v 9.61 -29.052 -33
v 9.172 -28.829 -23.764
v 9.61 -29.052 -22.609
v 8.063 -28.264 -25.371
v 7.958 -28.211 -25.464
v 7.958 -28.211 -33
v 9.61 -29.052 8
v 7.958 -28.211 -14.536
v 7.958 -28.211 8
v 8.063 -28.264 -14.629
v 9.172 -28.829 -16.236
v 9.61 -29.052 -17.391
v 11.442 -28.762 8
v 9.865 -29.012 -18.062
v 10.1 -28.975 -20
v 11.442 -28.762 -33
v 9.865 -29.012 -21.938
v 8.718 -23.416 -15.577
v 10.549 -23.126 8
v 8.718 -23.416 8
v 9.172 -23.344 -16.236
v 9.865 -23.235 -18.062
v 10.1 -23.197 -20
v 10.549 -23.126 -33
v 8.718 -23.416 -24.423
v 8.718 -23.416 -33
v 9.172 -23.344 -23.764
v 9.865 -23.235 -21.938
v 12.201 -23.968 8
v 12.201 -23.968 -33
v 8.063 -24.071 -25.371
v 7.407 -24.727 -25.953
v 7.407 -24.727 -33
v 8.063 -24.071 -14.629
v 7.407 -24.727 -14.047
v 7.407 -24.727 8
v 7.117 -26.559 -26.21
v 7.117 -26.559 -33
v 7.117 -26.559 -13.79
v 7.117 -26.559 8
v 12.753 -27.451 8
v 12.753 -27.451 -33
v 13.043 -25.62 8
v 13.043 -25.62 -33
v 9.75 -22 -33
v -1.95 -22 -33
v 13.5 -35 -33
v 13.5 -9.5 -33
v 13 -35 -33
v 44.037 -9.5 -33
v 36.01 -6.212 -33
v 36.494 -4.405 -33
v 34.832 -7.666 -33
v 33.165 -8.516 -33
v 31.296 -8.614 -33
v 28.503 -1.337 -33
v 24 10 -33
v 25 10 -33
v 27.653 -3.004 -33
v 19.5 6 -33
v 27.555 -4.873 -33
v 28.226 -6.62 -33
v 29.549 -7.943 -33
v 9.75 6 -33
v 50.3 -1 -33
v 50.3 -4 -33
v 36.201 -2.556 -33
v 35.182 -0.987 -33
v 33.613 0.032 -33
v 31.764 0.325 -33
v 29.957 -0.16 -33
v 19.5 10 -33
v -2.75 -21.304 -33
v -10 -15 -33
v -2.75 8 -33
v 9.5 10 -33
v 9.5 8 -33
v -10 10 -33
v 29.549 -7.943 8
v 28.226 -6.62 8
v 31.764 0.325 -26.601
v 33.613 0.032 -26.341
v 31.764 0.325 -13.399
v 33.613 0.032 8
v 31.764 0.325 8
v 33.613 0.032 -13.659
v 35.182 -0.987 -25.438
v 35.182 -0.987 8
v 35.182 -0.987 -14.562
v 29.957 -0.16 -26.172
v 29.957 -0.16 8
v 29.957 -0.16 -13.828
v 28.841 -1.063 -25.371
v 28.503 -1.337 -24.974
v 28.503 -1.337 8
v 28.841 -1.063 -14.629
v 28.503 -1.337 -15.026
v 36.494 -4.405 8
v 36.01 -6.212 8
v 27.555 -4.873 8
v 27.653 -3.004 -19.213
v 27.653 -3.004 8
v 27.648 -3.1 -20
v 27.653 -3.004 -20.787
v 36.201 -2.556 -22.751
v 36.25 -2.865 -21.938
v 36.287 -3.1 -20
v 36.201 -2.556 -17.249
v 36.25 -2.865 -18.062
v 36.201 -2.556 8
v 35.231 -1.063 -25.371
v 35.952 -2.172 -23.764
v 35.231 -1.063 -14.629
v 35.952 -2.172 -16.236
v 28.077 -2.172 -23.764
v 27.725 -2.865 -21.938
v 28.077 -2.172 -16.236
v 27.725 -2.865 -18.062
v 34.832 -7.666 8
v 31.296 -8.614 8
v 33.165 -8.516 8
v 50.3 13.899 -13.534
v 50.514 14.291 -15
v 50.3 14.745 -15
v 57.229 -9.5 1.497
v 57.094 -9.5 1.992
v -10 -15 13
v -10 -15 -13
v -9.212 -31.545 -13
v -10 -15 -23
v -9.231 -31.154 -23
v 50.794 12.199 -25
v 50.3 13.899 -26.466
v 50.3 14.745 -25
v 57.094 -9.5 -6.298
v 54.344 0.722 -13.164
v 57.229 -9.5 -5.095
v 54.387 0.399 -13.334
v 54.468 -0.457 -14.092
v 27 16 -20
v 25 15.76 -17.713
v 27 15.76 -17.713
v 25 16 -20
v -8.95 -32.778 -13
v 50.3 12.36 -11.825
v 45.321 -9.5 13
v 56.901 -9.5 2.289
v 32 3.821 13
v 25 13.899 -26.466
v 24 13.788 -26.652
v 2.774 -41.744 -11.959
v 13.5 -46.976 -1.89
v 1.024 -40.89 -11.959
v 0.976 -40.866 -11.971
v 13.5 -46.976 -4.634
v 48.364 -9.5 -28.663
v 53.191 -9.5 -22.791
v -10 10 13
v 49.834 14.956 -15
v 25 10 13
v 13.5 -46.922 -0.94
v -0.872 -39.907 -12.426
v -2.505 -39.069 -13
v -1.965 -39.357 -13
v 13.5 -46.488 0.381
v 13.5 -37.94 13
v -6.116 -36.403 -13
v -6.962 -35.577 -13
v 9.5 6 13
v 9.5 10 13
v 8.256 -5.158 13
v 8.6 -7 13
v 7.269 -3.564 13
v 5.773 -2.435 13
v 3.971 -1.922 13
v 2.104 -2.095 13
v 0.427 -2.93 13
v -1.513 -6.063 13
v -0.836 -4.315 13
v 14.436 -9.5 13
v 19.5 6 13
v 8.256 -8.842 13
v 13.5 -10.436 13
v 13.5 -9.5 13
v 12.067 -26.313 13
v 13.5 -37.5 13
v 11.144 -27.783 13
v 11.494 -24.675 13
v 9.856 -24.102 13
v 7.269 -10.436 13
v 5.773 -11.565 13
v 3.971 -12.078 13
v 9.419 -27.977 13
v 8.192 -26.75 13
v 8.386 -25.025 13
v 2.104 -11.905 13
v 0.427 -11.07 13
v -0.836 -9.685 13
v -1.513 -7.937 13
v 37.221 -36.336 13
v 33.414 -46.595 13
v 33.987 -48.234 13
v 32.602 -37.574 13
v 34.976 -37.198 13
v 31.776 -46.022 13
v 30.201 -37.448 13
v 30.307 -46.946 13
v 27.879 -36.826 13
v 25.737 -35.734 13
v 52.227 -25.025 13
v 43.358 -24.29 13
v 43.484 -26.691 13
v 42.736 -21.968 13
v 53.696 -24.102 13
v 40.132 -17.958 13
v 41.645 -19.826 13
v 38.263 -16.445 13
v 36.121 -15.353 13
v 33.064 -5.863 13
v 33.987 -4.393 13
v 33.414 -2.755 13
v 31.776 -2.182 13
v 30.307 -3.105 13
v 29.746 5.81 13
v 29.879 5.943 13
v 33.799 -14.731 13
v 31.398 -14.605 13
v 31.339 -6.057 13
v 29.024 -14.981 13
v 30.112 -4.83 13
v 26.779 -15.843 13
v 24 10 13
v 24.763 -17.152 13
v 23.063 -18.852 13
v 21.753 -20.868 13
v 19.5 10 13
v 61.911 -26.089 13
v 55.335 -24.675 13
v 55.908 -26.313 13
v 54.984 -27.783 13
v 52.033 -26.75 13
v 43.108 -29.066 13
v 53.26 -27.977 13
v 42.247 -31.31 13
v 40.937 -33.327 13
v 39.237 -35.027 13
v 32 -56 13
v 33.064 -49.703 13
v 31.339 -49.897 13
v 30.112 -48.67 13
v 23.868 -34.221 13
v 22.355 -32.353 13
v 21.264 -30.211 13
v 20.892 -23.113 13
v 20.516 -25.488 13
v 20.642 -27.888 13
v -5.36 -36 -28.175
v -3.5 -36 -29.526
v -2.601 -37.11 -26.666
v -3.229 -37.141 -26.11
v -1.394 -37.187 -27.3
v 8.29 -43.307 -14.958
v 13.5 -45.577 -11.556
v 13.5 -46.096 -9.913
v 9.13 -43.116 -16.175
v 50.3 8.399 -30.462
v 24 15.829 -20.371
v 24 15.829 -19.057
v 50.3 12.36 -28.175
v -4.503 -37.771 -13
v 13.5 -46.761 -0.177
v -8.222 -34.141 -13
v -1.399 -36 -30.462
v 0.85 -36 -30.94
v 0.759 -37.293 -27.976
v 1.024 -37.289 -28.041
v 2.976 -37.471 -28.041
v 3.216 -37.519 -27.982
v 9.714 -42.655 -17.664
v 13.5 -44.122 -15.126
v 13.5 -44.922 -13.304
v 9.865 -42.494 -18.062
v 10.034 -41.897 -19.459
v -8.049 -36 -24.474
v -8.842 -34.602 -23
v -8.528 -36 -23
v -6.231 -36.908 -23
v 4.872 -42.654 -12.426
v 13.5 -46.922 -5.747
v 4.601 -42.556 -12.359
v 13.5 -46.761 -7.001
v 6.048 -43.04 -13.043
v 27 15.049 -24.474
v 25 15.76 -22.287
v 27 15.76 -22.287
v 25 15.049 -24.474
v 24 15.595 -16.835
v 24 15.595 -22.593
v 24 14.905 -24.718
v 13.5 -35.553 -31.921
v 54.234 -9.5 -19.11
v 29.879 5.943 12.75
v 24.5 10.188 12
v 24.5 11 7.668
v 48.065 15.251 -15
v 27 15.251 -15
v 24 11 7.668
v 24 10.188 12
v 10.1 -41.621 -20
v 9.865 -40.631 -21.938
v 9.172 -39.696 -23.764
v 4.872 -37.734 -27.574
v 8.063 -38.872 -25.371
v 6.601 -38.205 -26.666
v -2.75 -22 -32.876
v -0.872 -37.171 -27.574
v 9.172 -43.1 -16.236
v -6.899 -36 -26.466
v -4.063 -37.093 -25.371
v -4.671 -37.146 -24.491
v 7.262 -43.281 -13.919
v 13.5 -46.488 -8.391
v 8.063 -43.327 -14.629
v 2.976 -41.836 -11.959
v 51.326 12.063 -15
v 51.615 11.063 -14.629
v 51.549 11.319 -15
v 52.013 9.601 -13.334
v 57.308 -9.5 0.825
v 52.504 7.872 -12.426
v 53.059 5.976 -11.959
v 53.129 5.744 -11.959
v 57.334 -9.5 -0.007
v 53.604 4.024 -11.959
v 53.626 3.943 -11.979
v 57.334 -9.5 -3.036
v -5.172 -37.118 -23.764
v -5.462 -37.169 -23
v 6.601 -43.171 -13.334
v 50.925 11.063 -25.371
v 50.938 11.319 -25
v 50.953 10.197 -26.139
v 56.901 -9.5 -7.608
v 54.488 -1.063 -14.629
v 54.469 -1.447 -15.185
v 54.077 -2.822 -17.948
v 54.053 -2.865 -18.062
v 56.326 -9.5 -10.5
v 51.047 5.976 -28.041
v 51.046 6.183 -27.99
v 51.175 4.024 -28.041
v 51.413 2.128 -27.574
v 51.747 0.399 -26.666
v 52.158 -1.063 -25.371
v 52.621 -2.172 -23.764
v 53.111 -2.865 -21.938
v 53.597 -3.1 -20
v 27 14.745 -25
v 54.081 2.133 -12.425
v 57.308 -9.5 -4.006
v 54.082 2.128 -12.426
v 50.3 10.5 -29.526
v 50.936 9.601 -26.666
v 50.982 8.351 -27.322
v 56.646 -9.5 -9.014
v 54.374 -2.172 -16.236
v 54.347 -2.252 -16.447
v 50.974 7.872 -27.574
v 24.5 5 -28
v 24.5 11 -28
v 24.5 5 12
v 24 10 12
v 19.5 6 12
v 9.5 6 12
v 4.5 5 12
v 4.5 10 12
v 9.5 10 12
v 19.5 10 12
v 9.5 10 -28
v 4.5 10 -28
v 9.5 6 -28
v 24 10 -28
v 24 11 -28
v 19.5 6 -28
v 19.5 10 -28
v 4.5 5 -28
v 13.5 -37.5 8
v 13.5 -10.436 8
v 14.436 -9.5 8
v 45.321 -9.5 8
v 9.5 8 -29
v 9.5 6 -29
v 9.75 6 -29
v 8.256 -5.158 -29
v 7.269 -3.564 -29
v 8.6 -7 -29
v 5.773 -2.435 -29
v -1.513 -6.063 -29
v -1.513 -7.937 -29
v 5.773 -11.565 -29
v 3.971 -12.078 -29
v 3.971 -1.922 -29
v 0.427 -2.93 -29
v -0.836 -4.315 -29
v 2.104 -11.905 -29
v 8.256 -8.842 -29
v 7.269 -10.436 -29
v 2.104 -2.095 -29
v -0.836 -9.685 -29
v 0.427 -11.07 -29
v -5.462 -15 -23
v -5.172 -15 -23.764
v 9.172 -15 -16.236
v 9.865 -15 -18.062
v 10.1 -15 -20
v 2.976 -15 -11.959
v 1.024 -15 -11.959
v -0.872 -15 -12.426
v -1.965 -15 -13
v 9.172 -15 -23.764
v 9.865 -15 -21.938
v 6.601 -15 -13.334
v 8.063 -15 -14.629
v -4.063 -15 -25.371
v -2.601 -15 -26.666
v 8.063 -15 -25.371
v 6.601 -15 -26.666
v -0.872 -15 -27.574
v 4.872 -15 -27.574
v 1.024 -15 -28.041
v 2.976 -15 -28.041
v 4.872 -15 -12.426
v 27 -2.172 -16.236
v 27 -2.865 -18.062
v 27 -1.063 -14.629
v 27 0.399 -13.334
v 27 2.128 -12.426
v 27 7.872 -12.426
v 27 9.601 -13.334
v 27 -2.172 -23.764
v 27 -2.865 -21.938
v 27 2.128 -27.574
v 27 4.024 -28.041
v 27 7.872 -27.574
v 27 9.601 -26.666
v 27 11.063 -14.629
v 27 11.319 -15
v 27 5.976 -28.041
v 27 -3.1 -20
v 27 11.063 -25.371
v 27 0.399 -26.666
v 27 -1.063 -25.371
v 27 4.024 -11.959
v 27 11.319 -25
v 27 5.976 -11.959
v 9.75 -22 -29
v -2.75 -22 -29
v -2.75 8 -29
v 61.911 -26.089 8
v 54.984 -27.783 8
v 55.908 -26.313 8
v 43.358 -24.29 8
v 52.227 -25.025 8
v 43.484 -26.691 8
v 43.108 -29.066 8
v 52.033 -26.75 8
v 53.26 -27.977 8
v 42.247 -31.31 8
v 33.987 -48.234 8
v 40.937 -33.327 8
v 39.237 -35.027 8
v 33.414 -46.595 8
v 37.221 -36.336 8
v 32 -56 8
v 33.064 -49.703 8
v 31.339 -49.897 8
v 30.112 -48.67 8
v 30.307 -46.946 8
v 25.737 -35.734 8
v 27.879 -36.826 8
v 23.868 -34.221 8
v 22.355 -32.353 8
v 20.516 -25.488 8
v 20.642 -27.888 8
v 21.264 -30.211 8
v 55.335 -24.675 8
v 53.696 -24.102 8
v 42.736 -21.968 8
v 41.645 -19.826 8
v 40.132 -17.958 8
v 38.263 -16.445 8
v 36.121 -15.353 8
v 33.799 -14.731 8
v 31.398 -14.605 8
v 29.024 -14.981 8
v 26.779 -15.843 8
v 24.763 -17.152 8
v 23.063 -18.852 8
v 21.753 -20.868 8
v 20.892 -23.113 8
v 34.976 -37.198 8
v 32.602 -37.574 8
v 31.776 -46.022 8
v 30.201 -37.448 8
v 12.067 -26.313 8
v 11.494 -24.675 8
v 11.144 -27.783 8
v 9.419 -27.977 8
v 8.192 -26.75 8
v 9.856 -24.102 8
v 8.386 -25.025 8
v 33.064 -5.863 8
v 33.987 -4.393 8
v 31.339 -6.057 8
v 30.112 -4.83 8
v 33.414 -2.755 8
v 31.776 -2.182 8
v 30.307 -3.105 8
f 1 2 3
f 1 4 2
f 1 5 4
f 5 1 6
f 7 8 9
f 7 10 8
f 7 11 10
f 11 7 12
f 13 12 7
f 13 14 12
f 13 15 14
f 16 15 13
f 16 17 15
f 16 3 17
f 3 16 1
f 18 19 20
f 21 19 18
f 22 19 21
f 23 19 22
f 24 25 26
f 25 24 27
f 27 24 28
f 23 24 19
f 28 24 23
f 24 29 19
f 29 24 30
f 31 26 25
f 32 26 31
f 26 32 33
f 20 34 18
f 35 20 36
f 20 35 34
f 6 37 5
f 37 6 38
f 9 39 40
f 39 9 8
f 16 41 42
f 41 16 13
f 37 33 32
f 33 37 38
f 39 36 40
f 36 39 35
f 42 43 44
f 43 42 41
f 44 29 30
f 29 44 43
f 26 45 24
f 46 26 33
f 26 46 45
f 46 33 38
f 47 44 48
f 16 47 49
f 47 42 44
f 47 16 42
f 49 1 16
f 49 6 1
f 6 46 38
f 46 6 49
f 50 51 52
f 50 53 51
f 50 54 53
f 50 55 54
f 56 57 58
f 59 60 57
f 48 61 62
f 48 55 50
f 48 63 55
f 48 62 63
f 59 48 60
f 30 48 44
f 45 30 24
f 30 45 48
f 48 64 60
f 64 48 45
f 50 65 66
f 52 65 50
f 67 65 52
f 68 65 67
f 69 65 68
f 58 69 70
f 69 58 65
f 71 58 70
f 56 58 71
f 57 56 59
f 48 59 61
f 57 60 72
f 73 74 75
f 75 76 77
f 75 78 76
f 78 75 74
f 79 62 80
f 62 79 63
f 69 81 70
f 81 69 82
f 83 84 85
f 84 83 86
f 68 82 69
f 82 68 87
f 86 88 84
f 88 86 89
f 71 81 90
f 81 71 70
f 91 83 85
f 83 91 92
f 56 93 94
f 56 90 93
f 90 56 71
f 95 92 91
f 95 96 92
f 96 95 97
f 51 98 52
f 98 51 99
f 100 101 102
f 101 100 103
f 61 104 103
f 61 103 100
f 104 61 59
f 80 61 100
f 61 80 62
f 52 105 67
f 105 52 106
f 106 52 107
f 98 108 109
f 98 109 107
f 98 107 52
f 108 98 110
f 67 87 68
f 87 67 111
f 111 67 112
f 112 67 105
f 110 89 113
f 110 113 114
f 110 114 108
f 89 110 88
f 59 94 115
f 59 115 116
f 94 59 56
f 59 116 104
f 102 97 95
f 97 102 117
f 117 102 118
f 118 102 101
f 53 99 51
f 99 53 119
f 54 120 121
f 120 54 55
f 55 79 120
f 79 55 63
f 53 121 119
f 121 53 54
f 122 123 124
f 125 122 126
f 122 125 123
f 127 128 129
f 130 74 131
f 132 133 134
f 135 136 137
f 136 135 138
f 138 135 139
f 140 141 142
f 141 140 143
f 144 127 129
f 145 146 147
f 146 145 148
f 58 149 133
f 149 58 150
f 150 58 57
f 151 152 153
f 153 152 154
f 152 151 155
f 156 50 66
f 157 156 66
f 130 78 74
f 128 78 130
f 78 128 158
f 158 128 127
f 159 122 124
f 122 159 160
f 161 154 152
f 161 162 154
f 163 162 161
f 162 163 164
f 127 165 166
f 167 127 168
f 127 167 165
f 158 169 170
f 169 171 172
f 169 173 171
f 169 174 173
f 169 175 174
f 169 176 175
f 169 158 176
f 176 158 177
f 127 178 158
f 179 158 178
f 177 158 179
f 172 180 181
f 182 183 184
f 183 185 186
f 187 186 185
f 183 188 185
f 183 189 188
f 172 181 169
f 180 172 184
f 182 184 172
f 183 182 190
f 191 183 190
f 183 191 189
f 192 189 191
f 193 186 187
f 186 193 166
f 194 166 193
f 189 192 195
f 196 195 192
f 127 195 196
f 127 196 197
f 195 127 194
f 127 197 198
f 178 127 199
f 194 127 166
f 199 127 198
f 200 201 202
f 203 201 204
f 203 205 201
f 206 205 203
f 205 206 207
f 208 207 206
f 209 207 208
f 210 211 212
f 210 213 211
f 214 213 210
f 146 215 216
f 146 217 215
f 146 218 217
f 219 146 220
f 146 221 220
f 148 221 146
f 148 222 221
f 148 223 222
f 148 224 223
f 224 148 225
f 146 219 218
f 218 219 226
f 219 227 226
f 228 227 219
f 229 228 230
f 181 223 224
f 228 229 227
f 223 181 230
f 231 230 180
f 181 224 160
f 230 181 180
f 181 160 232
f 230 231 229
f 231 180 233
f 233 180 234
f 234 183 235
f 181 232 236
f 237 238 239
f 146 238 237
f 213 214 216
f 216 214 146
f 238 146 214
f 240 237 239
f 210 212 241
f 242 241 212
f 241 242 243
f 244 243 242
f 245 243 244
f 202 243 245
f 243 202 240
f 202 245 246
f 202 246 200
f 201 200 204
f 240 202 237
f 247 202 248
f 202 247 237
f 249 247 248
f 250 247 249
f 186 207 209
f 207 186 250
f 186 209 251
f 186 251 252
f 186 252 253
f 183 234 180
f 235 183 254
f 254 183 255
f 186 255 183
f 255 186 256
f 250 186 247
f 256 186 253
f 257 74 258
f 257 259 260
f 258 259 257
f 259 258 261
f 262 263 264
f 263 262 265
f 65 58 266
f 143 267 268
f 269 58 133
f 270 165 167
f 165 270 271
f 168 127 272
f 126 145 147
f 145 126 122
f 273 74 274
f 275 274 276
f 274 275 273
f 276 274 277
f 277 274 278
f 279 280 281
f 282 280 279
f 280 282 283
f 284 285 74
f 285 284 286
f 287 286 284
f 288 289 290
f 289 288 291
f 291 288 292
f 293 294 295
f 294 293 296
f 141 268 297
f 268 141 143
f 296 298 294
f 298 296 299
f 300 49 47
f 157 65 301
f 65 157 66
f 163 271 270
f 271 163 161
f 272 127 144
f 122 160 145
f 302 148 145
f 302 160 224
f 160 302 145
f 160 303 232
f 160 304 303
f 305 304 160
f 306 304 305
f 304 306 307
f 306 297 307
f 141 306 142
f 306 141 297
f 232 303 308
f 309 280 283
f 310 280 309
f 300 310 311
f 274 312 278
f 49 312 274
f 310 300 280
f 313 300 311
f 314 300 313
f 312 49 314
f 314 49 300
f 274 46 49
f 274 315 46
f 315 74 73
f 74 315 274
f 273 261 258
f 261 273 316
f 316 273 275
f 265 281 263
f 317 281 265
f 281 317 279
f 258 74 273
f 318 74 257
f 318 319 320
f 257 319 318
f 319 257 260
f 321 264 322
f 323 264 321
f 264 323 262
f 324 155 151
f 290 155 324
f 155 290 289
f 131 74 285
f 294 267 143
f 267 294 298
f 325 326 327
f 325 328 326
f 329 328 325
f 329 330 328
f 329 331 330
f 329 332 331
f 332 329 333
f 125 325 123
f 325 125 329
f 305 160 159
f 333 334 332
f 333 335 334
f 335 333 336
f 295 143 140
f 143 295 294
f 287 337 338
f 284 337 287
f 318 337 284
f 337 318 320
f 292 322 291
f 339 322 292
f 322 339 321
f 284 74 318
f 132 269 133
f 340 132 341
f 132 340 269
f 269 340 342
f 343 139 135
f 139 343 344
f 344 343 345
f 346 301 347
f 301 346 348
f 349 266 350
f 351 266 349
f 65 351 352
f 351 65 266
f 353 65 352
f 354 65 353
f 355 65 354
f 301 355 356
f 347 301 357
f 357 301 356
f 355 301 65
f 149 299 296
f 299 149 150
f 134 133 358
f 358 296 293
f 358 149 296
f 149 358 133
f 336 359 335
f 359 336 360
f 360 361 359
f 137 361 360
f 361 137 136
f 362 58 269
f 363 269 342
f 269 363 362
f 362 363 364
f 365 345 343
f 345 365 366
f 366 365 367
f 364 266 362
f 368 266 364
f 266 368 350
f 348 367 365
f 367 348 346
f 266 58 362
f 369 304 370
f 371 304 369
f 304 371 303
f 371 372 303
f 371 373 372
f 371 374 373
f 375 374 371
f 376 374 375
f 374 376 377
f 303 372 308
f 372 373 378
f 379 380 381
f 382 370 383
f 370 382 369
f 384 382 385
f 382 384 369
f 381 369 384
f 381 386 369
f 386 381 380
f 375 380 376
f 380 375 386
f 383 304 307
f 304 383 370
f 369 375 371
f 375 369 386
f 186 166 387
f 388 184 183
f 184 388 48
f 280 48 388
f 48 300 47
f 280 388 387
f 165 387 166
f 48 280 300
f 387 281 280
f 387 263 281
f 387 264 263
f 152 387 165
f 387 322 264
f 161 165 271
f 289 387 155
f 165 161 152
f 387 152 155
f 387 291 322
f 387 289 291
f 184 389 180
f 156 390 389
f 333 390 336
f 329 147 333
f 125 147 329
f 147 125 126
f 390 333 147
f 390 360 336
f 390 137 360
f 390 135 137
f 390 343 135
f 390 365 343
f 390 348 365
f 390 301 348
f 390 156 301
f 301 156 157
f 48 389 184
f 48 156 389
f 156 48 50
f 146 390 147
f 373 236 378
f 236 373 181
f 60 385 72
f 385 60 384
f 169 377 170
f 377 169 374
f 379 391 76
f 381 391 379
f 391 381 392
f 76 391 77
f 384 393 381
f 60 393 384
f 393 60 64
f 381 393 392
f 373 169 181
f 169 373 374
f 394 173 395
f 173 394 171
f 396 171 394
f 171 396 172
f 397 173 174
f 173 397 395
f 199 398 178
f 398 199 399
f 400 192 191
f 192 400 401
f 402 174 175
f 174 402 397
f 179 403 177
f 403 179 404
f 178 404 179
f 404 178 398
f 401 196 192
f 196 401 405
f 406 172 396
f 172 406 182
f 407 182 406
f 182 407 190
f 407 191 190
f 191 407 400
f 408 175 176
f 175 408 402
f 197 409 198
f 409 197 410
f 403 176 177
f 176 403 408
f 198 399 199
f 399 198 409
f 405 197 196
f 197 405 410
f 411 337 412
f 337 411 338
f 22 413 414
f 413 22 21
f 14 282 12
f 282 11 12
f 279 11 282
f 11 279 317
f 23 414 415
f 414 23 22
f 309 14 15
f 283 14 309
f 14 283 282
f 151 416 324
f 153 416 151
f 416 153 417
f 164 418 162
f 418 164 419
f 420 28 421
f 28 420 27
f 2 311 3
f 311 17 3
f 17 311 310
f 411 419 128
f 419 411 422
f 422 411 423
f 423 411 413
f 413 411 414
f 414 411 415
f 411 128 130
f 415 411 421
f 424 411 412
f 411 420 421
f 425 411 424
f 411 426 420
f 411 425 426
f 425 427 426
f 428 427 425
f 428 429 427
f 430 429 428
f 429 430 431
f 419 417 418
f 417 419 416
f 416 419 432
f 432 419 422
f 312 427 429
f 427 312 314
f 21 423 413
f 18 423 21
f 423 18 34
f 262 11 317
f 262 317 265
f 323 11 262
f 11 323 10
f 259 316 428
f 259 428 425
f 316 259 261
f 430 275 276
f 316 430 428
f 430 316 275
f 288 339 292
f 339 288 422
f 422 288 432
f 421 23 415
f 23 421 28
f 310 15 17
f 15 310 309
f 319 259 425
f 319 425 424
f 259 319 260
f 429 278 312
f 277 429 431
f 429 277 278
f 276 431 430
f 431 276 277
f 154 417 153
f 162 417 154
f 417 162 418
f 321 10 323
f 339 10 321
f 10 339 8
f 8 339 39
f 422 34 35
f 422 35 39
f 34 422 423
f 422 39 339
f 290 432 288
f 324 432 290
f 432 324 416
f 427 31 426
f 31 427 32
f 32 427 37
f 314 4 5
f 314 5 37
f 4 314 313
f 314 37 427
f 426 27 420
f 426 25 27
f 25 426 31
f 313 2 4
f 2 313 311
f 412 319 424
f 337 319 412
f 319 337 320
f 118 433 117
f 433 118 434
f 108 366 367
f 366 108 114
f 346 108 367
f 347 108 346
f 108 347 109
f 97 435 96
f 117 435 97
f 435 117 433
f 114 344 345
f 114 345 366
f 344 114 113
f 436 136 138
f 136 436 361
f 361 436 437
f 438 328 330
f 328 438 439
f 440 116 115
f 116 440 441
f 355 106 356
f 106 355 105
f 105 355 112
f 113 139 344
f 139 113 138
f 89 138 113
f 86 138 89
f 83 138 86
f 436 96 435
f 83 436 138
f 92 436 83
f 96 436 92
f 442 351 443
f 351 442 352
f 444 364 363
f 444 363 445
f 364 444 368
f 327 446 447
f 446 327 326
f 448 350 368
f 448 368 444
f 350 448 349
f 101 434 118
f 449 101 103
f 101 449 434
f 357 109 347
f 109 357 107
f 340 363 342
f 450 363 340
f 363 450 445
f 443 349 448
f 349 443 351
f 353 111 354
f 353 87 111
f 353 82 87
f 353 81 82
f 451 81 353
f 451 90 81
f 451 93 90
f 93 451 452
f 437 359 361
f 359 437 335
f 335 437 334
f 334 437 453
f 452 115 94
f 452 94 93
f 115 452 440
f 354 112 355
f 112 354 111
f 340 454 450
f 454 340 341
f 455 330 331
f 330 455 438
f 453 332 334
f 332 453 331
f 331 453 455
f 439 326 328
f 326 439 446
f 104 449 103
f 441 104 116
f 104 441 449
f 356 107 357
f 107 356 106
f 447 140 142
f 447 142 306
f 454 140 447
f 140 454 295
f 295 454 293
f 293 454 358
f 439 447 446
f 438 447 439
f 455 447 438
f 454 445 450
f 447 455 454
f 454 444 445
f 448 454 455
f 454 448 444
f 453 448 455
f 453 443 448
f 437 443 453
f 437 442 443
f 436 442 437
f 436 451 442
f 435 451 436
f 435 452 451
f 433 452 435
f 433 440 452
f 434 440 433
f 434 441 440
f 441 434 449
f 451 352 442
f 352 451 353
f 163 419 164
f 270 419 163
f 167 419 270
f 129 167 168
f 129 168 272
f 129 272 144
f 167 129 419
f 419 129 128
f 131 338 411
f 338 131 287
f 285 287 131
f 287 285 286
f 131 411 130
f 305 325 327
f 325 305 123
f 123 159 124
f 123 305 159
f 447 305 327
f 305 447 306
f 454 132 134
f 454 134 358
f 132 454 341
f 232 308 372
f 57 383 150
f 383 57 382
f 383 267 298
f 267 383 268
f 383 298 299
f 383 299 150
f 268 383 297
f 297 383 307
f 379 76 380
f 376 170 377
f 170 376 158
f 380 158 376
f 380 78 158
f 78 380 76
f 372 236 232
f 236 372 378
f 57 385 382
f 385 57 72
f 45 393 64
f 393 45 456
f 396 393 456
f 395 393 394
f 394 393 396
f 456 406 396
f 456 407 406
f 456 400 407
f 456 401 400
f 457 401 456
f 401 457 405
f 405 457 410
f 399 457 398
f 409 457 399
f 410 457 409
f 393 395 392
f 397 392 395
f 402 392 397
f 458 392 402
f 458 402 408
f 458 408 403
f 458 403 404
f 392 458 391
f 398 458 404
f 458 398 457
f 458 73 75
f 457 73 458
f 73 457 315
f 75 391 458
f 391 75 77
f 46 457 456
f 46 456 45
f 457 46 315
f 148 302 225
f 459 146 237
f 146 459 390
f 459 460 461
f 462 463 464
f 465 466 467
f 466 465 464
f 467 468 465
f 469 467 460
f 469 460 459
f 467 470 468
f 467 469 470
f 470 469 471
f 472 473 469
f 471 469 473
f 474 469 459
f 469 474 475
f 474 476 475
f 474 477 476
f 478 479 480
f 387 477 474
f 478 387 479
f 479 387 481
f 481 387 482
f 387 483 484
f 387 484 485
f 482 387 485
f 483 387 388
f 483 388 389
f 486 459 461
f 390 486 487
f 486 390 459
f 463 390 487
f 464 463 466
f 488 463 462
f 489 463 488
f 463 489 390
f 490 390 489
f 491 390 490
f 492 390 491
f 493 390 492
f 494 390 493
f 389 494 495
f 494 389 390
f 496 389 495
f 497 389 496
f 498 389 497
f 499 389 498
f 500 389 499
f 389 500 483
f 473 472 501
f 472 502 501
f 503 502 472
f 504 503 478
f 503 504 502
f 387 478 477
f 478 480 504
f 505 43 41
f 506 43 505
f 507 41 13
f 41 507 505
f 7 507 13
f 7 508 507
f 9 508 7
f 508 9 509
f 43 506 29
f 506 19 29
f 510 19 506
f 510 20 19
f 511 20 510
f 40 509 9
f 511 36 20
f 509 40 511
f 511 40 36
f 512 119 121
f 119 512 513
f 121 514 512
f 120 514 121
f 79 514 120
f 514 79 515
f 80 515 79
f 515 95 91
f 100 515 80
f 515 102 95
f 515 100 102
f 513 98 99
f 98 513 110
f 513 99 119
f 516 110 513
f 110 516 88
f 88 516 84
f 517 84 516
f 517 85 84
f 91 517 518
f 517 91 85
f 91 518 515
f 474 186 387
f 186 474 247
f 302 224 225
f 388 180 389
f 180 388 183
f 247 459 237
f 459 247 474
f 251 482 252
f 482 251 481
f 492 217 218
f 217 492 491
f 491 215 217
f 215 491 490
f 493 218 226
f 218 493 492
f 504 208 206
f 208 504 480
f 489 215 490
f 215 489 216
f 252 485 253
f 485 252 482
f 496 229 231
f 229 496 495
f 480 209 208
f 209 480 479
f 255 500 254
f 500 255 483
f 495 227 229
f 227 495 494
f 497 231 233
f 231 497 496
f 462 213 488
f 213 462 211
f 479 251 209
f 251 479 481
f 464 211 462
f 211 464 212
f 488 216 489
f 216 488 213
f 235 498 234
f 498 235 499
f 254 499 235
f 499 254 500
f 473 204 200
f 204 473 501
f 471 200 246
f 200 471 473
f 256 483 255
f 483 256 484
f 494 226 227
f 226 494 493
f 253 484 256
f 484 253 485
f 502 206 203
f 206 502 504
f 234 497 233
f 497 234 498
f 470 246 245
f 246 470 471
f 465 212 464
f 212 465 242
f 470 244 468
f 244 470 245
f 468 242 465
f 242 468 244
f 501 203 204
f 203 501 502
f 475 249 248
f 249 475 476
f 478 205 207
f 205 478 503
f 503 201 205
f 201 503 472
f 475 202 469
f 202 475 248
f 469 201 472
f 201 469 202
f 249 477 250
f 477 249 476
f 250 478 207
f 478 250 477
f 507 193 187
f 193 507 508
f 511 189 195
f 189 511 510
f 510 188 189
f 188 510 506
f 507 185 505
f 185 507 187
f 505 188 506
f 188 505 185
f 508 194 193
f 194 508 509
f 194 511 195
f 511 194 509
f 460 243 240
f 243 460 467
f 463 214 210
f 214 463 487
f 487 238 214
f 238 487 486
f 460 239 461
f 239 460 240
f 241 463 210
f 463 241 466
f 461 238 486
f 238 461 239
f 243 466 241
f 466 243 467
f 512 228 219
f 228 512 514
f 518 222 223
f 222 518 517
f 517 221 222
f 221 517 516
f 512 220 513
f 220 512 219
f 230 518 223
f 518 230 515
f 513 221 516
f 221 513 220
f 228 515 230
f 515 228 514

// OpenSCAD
height = 0;
colour = "green";

difference(){
     color(colour)
        //rough shape
        hull(){
            //1 'arm'
            translate([2,-15,height-20]){
                rotate([90,0,0]){
                    color(colour)
                        cylinder(21,11,11);
                }
            }
            translate([13,-35,height-33]){
               color(colour)  
                    cube([2,20,5]);
            }
            
            //the other 'arm'
            translate([25,5,height-20]){
                rotate([90,0,90]){
                    color(colour)
                            cylinder(25.3,11,11);
                }
            }
            translate([25,-4,height-33]){
               color(colour)  
                 cube([25.3,3,2]);
            }
      
            //back section
            translate([-10,-15,height-33]){
                       color(colour)  
                            cube([35,25,46]);
            }
            
            //motor mount
            translate([32,-56,height+8]){
                rotate([0,0,45]){
                cube([42.3,42.3,5]);
            }
            }
        }
        
        //clear out more space around the stepper
        translate([4.5,5,height-28]){
            cube([20,6,40]);
        }
        translate([13.5 ,-59.5,height-60]){
             color(colour) 
                   cube([50,50,75]);
        }
        //space for the linear rail
        translate([9.5,6,height-50]){
             color(colour) 
                cube([10,7,80]);
        }
        //space for the threaded rod
        translate([3.5,-7,height-50]){
             color(colour) 
                cylinder(80,5.1,5.1);
        }
        
       //space for gantry rod
      translate([2,-15,height-20]){
                rotate([90,0,0]){
                   color(colour)  cylinder(45,8.1,8.1);
                }
      }  
      translate([27,5,height-20]){
                rotate([90,0,90]){
                        difference(){
                           color(colour)   
                            cylinder(35,8.1,8.1);
                            
                        }
                }
            }
     //cutouts to get rods in
     translate([-45,-60,height-23]){       
         rotate([0,0,0]){
            cube([45,45,10]);
         }   
     }
     translate([27,-1,height-25]){       
         rotate([0,0,0]){
            cube([45,45,10]);
         }   
     }
     //screw holes for stepper mount
         translate([32,-56,height-33]){
            rotate([0,0,45]){
             width = 42.3;
                //cube([width,width,5]);
                centre = width / 2;
                offset = 31/2;
             translate([centre - offset,centre - offset,0]){
                cylinder(60,4.5,4.5);
            }
            translate([centre - offset,centre + offset,0]){
                cylinder(60,3,3);
            }
            translate([centre + offset,centre + offset,0]){
                cylinder(60,4.5,4.5);
            }
            }
             
         }
         //plane off back
         translate([-20,10,height-33]){
             cube([44,10,46]);
         }
         //space for the nut that goes on the threaded rod
        translate([-2.75,-22,height-35]){
             color(colour) 
                cube([12.5,30,6]);
        }
    }
   
            
     //the stepper motor mount
    difference(){
     color(colour)
      translate([32,-56,height+8]){
        rotate([0,0,45]){
            difference(){
                width = 42.3;
                cube([width,width+3,5]);
                centre = width / 2;
                offset = 31/2;
                
                translate([centre,centre,0]){
                    cylinder(10,11.5,11.5);
                }
                translate([centre - offset,centre - offset,0]){
                    cylinder(12,2,2);
                }
                translate([centre - offset,centre + offset,0]){
                    cylinder(12,2,2);
                }
                translate([centre + offset,centre - offset,0]){
                    cylinder(12,2,2);
                }
                translate([centre + offset,centre + offset,0]){
                    cylinder(12,2,2);
                }
            }
        }
    }
    //space for the nut that goes on the threaded rod duplicated for stepper mount edge
        translate([-2.75,-22,height-35]){
             color(colour) 
                cube([12.5,30,6]);
        }
}
